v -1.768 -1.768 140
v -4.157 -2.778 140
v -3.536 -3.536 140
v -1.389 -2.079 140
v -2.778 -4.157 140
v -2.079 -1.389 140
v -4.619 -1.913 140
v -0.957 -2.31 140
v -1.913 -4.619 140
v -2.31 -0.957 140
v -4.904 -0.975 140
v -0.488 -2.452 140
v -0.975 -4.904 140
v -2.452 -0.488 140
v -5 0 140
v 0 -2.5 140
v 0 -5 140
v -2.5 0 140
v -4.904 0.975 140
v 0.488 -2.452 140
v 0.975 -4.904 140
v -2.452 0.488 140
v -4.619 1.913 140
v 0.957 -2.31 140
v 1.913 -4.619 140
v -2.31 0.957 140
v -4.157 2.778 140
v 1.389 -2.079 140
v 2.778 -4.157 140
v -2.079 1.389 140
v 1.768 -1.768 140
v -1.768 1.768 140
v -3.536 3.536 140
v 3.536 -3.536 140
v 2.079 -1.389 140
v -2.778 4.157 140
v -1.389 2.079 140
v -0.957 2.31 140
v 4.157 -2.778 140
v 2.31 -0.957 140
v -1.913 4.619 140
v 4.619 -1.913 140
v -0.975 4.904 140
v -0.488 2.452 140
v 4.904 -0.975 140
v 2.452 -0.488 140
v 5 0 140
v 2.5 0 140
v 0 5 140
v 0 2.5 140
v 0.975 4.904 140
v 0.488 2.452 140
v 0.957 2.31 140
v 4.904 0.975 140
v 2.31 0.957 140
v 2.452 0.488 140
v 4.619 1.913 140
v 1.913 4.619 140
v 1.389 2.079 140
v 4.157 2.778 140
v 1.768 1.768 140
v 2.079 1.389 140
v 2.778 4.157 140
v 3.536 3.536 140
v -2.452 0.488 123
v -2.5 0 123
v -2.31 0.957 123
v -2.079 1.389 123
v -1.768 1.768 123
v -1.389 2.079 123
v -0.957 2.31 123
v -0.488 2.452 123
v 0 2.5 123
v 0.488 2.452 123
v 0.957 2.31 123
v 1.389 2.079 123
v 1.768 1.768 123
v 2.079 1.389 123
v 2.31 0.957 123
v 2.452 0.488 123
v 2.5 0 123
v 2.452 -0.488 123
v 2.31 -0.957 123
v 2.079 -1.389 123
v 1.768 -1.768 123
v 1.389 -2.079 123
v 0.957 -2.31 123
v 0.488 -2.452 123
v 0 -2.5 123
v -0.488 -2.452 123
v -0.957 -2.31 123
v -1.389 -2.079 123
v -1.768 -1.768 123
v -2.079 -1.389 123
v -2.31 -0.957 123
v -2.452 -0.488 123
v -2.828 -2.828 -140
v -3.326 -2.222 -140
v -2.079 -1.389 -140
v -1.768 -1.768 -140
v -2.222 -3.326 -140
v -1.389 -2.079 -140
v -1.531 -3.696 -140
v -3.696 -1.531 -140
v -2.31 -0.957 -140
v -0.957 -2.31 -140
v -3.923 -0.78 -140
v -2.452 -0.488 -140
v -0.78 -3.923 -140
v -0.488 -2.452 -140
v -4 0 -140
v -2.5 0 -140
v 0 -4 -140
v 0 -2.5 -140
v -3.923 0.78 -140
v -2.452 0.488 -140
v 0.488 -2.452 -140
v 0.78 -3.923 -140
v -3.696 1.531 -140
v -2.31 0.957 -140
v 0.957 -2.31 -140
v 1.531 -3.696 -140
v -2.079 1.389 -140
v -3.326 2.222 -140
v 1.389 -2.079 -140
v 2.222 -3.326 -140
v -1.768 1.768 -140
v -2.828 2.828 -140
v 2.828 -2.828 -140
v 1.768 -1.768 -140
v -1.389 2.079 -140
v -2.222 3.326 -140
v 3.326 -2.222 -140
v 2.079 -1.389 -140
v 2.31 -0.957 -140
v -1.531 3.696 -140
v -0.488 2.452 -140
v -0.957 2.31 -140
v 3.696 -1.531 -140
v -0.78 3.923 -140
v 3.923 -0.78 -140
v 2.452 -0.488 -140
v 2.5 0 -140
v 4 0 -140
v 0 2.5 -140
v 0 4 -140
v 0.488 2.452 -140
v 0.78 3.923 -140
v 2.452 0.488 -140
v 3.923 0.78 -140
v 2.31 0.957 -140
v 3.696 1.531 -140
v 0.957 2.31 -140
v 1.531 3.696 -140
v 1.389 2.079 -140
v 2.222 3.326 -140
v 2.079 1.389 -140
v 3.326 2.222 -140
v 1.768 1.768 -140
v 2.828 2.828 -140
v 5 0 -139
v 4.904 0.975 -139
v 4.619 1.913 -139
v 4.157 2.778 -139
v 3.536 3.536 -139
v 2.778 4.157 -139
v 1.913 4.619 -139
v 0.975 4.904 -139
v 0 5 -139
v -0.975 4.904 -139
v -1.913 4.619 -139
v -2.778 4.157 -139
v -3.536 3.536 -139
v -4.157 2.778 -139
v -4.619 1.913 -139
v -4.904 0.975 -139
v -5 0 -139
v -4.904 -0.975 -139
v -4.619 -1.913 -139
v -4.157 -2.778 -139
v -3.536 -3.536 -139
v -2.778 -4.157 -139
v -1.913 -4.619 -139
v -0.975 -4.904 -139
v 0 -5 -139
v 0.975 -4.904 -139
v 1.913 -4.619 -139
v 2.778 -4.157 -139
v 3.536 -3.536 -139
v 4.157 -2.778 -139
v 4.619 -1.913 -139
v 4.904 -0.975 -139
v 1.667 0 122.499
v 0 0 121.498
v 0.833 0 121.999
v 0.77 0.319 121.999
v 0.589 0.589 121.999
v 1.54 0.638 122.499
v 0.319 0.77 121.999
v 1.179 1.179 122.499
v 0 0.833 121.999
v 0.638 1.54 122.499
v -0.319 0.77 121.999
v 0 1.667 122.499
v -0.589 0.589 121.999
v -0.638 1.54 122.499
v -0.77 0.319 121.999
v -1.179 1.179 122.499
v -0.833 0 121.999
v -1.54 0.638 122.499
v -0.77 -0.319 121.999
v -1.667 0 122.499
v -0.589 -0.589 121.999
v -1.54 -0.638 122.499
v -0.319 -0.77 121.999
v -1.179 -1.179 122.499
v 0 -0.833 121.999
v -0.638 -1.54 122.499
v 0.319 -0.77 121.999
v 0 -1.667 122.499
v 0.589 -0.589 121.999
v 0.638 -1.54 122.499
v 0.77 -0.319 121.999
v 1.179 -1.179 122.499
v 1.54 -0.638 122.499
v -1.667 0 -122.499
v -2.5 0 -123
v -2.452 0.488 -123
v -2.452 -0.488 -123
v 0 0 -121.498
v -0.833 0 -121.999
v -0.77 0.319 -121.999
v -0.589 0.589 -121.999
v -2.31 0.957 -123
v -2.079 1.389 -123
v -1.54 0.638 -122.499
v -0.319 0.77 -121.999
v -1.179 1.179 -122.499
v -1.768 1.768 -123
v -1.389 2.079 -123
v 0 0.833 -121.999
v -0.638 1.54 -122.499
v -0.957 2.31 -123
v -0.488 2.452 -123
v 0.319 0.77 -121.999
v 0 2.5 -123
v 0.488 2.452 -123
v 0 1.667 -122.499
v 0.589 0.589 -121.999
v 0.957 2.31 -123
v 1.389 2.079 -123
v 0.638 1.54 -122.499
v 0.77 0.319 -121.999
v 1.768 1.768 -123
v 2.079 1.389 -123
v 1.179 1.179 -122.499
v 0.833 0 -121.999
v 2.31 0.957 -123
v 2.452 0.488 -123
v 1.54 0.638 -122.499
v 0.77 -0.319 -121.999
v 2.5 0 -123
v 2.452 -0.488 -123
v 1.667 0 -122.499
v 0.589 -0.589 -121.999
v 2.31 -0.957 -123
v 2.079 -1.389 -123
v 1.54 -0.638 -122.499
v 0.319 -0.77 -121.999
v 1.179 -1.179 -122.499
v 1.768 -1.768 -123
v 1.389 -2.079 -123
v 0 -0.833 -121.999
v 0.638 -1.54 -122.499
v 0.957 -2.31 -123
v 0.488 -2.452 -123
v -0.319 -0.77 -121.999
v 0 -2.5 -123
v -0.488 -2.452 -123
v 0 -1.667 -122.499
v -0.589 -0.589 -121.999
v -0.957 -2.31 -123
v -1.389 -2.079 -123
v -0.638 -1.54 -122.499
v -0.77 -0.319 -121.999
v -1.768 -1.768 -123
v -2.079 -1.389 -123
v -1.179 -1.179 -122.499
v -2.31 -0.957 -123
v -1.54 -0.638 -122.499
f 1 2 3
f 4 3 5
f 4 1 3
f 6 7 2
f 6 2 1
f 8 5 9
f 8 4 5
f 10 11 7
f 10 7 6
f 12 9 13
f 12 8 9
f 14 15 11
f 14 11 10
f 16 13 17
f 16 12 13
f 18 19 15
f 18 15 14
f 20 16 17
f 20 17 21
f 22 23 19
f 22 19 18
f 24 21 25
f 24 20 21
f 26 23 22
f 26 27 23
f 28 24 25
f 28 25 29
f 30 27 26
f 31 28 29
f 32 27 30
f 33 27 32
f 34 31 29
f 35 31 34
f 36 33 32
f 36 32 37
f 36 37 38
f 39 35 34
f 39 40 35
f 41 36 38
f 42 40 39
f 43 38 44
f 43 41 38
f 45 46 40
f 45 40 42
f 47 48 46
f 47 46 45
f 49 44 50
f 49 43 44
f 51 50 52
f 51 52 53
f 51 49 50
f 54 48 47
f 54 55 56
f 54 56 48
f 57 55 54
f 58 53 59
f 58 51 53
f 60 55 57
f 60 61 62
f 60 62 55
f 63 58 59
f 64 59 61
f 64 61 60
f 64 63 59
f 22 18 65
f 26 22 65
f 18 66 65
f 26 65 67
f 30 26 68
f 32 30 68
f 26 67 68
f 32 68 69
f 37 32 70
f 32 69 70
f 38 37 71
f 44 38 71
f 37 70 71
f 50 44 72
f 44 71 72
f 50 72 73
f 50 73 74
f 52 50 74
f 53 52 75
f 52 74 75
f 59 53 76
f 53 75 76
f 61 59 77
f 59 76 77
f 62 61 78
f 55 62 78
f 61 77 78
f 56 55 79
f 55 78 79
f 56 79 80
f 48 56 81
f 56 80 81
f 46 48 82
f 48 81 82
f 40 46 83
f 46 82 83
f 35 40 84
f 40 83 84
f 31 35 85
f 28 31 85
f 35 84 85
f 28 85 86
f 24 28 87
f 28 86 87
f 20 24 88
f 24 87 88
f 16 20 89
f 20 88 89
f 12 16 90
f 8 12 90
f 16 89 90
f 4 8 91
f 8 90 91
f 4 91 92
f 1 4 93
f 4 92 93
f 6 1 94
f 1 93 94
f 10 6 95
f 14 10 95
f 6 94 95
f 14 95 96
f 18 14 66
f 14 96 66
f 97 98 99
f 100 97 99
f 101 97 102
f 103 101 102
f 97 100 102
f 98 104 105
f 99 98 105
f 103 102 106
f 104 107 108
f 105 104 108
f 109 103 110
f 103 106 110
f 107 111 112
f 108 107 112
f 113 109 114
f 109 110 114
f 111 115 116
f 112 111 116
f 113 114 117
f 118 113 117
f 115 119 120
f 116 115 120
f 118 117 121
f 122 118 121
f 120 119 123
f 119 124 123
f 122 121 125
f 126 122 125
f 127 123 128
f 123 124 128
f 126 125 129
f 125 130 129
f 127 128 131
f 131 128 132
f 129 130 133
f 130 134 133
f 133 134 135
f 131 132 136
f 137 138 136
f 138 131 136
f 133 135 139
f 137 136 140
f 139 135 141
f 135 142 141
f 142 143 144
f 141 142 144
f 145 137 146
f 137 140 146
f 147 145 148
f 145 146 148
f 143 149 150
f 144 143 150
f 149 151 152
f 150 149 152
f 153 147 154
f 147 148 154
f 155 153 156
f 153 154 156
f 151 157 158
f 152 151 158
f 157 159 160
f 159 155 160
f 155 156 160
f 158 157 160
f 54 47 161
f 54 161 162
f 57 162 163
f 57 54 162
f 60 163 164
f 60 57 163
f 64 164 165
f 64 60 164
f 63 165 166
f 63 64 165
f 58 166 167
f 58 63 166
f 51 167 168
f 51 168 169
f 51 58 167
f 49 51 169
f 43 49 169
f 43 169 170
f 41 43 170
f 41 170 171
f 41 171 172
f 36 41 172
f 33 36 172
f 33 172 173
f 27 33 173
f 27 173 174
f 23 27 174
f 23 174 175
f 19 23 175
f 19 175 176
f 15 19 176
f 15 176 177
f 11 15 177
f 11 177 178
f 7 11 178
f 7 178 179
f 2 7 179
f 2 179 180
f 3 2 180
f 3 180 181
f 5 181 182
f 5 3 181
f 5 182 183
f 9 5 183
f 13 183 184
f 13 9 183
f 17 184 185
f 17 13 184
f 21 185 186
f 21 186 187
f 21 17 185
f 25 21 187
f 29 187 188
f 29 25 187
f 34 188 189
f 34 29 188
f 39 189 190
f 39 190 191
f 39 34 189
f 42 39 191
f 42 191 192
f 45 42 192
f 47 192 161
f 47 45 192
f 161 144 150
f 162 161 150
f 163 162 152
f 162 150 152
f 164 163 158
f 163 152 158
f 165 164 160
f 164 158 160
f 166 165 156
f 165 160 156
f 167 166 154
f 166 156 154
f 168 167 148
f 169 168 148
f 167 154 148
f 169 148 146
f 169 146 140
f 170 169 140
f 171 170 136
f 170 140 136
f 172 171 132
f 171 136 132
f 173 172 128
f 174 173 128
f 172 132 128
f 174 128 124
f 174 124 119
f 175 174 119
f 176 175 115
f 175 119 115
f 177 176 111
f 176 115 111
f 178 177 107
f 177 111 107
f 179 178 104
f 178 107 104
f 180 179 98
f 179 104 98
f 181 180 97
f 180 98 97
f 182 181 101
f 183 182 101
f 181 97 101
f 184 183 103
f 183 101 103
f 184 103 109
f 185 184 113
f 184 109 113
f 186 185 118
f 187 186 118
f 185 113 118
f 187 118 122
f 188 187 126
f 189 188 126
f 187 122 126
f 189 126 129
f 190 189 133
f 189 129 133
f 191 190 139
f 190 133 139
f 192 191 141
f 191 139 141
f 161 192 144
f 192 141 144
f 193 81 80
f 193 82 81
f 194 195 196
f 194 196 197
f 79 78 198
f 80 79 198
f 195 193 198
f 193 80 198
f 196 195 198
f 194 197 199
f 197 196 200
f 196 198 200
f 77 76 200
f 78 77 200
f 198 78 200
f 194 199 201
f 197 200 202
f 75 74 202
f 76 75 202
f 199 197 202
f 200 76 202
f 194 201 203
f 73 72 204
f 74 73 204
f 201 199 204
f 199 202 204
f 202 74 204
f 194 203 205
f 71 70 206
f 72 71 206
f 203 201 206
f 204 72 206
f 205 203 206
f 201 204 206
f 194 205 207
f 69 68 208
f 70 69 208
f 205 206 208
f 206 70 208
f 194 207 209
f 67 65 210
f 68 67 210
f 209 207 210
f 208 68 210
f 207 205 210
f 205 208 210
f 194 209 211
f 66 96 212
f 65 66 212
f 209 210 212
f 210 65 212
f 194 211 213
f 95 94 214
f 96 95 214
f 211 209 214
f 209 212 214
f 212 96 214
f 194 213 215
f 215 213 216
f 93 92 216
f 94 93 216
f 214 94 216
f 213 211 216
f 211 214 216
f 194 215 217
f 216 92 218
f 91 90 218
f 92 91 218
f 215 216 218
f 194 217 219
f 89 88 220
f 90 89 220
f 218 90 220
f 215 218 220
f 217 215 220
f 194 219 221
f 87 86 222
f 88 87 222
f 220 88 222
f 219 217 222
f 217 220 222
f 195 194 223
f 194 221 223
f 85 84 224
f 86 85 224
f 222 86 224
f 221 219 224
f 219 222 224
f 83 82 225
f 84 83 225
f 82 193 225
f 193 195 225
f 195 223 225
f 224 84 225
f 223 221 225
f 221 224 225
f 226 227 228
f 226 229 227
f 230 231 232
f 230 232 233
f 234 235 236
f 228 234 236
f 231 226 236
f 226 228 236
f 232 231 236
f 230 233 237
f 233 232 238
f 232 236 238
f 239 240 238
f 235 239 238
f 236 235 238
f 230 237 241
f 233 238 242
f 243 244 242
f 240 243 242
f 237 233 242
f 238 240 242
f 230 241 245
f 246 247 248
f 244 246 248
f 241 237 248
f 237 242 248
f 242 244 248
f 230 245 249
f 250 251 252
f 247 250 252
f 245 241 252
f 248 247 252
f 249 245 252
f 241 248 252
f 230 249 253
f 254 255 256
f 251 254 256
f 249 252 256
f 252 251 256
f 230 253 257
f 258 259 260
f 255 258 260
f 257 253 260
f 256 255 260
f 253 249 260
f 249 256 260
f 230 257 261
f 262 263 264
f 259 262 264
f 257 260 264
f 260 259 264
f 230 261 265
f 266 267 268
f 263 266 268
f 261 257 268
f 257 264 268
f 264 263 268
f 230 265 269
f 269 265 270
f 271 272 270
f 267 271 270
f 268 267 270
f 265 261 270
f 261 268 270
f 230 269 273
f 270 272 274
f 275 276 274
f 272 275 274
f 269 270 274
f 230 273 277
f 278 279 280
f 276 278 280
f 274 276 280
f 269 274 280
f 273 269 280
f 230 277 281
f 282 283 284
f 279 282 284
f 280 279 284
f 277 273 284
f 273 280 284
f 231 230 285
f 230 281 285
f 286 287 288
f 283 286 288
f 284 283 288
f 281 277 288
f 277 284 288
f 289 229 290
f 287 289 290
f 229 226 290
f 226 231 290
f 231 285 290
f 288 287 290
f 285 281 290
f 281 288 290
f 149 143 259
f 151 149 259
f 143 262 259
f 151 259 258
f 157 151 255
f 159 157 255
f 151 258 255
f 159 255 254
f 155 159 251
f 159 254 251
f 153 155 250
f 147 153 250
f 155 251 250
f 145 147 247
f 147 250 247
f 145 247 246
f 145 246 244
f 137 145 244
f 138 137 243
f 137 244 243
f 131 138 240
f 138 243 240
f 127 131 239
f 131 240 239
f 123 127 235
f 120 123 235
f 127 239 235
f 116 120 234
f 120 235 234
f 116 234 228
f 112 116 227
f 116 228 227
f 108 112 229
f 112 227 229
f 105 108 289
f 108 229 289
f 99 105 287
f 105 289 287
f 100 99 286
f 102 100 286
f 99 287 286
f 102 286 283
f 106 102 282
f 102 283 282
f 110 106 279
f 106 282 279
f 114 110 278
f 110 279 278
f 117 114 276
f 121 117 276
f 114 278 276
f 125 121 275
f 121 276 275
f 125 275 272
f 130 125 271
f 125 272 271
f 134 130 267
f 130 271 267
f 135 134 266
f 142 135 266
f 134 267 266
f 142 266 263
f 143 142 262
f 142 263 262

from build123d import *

# Parameters (mm, degrees)
CROQUIS1_R                = 5
SALIENTE_EXTRUIR1_DEPTH   = 140
TALADRO_ROSCADO_M61_D     = 5
TALADRO_ROSCADO_M61_DEPTH = 17
TALADRO_ROSCADO_M61_TIP   = 1.502151548
TALADRO_ROSCADO_M62_D     = 5
TALADRO_ROSCADO_M62_DEPTH = 17
TALADRO_ROSCADO_M62_TIP   = 1.502151548
CHAFL_N1_SIZE             = 1


with BuildPart() as part:
    # Croquis1 → Saliente-Extruir1 (new, symmetric)
    with BuildSketch(Plane.XY):
        Circle(CROQUIS1_R)
    extrude(amount=SALIENTE_EXTRUIR1_DEPTH, both=True)

    # Taladro roscado M61
    with Locations(Plane.XY.offset(140)):
        with Locations((0, 0)):
            Hole(TALADRO_ROSCADO_M61_D / 2, depth=TALADRO_ROSCADO_M61_DEPTH)
            with Locations((0, 0, -(TALADRO_ROSCADO_M61_DEPTH + TALADRO_ROSCADO_M61_TIP / 2))):  # 118° drill point
                Cone(0, TALADRO_ROSCADO_M61_D / 2, TALADRO_ROSCADO_M61_TIP, mode=Mode.SUBTRACT)

    # Taladro roscado M62
    with Locations(Plane(origin=(0, 0, -140), x_dir=(-1, 0, 0), z_dir=(0, 0, -1))):
        with Locations((0, 0)):
            Hole(TALADRO_ROSCADO_M62_D / 2, depth=TALADRO_ROSCADO_M62_DEPTH)
            with Locations((0, 0, -(TALADRO_ROSCADO_M62_DEPTH + TALADRO_ROSCADO_M62_TIP / 2))):  # 118° drill point
                Cone(0, TALADRO_ROSCADO_M62_D / 2, TALADRO_ROSCADO_M62_TIP, mode=Mode.SUBTRACT)

    # Chaflán1
    chafl_n1_edges = [part.edges().sort_by_distance(p)[0] for p in [
        (-5, 0, -140),
    ]]
    chamfer(chafl_n1_edges, length=CHAFL_N1_SIZE)


solid = part.part
